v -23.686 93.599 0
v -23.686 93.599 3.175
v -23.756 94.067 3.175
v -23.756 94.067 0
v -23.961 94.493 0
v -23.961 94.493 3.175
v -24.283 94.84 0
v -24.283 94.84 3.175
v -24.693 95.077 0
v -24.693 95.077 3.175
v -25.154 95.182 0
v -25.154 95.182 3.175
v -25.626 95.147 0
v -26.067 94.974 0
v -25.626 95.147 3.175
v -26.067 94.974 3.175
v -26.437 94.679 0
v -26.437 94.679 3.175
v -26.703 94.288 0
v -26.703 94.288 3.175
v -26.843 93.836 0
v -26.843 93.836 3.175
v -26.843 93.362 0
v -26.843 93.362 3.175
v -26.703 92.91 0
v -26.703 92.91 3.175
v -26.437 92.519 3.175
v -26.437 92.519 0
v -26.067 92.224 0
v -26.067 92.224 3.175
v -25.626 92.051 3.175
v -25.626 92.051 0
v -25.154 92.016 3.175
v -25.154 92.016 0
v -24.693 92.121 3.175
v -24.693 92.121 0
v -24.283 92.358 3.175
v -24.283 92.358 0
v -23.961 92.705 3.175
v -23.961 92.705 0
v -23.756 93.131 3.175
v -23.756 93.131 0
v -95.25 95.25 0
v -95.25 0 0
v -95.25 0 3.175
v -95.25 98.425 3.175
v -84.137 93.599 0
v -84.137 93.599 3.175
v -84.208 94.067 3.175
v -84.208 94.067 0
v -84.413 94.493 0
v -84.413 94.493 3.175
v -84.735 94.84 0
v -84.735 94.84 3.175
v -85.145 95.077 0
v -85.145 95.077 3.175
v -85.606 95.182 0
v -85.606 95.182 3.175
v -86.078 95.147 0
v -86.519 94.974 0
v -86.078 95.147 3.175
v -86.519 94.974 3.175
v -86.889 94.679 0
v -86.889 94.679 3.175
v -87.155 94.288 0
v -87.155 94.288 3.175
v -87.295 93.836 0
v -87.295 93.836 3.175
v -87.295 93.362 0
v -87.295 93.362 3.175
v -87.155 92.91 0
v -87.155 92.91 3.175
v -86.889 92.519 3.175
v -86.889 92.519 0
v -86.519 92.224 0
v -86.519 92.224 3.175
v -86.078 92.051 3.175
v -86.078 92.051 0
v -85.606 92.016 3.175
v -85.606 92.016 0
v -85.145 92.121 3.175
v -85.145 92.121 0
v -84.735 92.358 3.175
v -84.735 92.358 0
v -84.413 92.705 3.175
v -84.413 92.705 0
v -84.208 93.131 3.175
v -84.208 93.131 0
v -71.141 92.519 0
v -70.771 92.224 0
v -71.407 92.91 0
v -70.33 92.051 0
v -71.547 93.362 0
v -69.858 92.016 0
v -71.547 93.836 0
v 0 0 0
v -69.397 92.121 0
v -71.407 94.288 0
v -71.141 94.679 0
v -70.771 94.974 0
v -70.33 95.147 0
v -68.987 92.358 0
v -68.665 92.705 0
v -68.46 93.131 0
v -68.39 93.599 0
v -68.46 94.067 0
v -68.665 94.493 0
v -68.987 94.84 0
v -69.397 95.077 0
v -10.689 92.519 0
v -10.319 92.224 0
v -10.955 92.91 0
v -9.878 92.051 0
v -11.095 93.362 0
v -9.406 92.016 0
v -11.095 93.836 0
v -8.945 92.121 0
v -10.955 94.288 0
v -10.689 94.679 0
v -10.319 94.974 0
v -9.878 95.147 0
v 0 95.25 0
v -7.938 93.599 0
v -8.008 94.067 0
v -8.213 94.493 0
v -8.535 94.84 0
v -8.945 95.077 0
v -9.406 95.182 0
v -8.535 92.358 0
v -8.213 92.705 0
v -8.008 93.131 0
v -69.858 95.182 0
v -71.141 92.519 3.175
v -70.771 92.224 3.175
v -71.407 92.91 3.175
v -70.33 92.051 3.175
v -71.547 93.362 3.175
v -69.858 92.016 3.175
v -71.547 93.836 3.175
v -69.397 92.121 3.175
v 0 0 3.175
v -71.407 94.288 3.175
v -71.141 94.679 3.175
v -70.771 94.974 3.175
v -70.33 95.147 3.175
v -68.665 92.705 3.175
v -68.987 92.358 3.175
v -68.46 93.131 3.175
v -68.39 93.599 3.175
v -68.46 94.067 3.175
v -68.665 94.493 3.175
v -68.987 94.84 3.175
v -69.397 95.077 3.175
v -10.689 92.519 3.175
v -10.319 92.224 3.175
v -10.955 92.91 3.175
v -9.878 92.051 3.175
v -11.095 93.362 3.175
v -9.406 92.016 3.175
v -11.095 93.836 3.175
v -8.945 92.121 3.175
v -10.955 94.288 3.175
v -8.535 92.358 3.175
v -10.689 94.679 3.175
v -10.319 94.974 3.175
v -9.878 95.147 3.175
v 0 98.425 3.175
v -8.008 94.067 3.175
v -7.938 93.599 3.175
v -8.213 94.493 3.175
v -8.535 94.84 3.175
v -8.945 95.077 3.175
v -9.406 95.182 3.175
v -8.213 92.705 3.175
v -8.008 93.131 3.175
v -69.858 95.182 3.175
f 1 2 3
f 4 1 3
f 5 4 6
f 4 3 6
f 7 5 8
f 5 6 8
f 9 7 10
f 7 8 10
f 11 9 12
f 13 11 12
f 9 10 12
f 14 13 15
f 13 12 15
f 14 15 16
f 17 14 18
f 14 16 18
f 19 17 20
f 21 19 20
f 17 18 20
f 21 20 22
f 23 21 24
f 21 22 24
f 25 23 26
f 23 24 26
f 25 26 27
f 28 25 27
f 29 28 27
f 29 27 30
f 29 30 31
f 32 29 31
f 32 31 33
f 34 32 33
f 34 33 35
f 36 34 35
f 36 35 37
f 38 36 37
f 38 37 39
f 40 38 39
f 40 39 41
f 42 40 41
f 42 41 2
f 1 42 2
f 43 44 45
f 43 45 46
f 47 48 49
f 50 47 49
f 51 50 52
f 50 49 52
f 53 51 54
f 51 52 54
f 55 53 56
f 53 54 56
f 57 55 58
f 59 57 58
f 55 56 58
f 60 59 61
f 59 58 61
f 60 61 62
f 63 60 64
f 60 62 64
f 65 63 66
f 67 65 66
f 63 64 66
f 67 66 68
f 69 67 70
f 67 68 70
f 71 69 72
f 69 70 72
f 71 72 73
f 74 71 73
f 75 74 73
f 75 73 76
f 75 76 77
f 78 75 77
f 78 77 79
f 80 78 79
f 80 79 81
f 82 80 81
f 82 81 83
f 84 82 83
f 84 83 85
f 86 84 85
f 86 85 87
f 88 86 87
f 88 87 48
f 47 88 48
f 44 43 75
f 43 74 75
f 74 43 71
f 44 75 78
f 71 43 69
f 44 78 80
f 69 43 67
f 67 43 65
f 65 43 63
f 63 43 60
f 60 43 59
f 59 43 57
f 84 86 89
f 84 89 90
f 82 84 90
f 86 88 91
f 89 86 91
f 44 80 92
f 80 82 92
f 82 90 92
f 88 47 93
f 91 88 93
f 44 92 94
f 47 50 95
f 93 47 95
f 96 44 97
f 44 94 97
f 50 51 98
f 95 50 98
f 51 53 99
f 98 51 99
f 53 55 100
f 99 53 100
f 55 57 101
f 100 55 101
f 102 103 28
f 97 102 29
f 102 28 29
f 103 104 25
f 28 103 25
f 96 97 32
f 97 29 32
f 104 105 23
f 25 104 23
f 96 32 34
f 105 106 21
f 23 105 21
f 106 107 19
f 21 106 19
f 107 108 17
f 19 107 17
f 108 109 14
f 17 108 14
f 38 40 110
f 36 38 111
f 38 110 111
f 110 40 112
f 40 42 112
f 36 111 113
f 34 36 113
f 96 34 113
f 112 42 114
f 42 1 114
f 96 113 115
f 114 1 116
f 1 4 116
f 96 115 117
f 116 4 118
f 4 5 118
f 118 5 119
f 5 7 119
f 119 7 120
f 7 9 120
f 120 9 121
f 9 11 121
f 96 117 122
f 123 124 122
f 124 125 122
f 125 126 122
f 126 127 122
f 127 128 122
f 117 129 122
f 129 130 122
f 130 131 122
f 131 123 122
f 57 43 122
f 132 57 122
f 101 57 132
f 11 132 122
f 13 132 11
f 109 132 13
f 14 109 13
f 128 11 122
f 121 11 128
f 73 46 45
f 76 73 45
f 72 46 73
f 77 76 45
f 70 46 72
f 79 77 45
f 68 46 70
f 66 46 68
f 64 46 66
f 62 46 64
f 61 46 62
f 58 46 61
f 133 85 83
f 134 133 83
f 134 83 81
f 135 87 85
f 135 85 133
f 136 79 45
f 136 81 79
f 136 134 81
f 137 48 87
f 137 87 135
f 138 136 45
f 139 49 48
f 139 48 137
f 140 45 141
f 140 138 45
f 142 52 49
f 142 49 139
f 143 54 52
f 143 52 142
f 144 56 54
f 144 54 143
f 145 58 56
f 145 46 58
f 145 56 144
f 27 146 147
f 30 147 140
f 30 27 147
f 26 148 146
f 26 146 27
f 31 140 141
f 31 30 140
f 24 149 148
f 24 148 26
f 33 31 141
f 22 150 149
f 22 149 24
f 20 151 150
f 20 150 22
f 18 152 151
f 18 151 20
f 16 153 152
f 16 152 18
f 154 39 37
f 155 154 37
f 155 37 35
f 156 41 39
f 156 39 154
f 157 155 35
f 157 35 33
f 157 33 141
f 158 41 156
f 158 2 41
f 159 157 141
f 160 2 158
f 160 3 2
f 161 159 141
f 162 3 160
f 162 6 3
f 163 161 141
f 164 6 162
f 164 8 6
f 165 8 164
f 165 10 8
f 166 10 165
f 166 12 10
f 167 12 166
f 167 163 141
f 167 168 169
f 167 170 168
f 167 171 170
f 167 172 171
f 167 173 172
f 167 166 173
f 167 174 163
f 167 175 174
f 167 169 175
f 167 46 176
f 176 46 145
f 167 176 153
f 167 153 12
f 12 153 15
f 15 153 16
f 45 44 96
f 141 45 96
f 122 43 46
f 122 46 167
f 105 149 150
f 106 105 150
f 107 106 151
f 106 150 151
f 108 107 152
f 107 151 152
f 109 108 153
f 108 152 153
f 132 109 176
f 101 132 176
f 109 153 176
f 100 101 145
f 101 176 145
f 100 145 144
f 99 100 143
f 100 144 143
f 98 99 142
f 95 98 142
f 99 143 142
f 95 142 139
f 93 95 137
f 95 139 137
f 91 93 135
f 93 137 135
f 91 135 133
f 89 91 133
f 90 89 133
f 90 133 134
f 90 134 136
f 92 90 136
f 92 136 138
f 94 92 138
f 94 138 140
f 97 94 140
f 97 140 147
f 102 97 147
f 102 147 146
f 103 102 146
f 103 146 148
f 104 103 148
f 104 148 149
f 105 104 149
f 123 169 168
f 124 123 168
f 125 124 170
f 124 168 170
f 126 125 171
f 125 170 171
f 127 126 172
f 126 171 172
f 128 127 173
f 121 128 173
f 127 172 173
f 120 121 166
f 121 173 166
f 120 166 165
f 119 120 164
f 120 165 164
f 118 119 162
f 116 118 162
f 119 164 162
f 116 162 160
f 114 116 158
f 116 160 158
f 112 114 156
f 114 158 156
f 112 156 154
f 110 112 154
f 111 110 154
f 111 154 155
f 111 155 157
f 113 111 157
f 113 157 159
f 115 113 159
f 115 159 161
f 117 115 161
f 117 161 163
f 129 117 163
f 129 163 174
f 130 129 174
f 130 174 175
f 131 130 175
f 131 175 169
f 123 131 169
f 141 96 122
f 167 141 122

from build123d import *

# Parameters (mm, degrees)
SKETCH1_W           = 95.25
SKETCH1_H           = 98.425
BOSS_EXTRUDE1_DEPTH = 3.175
CHAMFER1_SIZE       = 3.175
SKETCH2_R           = 1.5875
CUT_EXTRUDE1_DEPTH  = 17.78


with BuildPart() as part:
    # Sketch1 → Boss-Extrude1 (new body)
    with BuildSketch(Plane.XY):
        with Locations((-47.625, 49.2125)):
            Rectangle(SKETCH1_W, SKETCH1_H)
    extrude(amount=BOSS_EXTRUDE1_DEPTH)

    # Chamfer1
    chamfer1_edges = [part.edges().sort_by_distance(p)[0] for p in [
        (-47.625, 98.425, 0),
    ]]
    chamfer(chamfer1_edges, length=CHAMFER1_SIZE - 0.0001)  # a hair under: the kernel refuses the full size

    # Sketch2 → Cut-Extrude1 (cut)
    with BuildSketch(Plane.XY.offset(3.175)):
        with Locations((-85.725, 93.599)):
            Circle(SKETCH2_R)
        with Locations((-69.977, 93.599)):
            Circle(SKETCH2_R)
        with Locations((-25.273, 93.599)):
            Circle(SKETCH2_R)
        with Locations((-9.525, 93.599)):
            Circle(SKETCH2_R)
    extrude(amount=-CUT_EXTRUDE1_DEPTH, mode=Mode.SUBTRACT)


solid = part.part
